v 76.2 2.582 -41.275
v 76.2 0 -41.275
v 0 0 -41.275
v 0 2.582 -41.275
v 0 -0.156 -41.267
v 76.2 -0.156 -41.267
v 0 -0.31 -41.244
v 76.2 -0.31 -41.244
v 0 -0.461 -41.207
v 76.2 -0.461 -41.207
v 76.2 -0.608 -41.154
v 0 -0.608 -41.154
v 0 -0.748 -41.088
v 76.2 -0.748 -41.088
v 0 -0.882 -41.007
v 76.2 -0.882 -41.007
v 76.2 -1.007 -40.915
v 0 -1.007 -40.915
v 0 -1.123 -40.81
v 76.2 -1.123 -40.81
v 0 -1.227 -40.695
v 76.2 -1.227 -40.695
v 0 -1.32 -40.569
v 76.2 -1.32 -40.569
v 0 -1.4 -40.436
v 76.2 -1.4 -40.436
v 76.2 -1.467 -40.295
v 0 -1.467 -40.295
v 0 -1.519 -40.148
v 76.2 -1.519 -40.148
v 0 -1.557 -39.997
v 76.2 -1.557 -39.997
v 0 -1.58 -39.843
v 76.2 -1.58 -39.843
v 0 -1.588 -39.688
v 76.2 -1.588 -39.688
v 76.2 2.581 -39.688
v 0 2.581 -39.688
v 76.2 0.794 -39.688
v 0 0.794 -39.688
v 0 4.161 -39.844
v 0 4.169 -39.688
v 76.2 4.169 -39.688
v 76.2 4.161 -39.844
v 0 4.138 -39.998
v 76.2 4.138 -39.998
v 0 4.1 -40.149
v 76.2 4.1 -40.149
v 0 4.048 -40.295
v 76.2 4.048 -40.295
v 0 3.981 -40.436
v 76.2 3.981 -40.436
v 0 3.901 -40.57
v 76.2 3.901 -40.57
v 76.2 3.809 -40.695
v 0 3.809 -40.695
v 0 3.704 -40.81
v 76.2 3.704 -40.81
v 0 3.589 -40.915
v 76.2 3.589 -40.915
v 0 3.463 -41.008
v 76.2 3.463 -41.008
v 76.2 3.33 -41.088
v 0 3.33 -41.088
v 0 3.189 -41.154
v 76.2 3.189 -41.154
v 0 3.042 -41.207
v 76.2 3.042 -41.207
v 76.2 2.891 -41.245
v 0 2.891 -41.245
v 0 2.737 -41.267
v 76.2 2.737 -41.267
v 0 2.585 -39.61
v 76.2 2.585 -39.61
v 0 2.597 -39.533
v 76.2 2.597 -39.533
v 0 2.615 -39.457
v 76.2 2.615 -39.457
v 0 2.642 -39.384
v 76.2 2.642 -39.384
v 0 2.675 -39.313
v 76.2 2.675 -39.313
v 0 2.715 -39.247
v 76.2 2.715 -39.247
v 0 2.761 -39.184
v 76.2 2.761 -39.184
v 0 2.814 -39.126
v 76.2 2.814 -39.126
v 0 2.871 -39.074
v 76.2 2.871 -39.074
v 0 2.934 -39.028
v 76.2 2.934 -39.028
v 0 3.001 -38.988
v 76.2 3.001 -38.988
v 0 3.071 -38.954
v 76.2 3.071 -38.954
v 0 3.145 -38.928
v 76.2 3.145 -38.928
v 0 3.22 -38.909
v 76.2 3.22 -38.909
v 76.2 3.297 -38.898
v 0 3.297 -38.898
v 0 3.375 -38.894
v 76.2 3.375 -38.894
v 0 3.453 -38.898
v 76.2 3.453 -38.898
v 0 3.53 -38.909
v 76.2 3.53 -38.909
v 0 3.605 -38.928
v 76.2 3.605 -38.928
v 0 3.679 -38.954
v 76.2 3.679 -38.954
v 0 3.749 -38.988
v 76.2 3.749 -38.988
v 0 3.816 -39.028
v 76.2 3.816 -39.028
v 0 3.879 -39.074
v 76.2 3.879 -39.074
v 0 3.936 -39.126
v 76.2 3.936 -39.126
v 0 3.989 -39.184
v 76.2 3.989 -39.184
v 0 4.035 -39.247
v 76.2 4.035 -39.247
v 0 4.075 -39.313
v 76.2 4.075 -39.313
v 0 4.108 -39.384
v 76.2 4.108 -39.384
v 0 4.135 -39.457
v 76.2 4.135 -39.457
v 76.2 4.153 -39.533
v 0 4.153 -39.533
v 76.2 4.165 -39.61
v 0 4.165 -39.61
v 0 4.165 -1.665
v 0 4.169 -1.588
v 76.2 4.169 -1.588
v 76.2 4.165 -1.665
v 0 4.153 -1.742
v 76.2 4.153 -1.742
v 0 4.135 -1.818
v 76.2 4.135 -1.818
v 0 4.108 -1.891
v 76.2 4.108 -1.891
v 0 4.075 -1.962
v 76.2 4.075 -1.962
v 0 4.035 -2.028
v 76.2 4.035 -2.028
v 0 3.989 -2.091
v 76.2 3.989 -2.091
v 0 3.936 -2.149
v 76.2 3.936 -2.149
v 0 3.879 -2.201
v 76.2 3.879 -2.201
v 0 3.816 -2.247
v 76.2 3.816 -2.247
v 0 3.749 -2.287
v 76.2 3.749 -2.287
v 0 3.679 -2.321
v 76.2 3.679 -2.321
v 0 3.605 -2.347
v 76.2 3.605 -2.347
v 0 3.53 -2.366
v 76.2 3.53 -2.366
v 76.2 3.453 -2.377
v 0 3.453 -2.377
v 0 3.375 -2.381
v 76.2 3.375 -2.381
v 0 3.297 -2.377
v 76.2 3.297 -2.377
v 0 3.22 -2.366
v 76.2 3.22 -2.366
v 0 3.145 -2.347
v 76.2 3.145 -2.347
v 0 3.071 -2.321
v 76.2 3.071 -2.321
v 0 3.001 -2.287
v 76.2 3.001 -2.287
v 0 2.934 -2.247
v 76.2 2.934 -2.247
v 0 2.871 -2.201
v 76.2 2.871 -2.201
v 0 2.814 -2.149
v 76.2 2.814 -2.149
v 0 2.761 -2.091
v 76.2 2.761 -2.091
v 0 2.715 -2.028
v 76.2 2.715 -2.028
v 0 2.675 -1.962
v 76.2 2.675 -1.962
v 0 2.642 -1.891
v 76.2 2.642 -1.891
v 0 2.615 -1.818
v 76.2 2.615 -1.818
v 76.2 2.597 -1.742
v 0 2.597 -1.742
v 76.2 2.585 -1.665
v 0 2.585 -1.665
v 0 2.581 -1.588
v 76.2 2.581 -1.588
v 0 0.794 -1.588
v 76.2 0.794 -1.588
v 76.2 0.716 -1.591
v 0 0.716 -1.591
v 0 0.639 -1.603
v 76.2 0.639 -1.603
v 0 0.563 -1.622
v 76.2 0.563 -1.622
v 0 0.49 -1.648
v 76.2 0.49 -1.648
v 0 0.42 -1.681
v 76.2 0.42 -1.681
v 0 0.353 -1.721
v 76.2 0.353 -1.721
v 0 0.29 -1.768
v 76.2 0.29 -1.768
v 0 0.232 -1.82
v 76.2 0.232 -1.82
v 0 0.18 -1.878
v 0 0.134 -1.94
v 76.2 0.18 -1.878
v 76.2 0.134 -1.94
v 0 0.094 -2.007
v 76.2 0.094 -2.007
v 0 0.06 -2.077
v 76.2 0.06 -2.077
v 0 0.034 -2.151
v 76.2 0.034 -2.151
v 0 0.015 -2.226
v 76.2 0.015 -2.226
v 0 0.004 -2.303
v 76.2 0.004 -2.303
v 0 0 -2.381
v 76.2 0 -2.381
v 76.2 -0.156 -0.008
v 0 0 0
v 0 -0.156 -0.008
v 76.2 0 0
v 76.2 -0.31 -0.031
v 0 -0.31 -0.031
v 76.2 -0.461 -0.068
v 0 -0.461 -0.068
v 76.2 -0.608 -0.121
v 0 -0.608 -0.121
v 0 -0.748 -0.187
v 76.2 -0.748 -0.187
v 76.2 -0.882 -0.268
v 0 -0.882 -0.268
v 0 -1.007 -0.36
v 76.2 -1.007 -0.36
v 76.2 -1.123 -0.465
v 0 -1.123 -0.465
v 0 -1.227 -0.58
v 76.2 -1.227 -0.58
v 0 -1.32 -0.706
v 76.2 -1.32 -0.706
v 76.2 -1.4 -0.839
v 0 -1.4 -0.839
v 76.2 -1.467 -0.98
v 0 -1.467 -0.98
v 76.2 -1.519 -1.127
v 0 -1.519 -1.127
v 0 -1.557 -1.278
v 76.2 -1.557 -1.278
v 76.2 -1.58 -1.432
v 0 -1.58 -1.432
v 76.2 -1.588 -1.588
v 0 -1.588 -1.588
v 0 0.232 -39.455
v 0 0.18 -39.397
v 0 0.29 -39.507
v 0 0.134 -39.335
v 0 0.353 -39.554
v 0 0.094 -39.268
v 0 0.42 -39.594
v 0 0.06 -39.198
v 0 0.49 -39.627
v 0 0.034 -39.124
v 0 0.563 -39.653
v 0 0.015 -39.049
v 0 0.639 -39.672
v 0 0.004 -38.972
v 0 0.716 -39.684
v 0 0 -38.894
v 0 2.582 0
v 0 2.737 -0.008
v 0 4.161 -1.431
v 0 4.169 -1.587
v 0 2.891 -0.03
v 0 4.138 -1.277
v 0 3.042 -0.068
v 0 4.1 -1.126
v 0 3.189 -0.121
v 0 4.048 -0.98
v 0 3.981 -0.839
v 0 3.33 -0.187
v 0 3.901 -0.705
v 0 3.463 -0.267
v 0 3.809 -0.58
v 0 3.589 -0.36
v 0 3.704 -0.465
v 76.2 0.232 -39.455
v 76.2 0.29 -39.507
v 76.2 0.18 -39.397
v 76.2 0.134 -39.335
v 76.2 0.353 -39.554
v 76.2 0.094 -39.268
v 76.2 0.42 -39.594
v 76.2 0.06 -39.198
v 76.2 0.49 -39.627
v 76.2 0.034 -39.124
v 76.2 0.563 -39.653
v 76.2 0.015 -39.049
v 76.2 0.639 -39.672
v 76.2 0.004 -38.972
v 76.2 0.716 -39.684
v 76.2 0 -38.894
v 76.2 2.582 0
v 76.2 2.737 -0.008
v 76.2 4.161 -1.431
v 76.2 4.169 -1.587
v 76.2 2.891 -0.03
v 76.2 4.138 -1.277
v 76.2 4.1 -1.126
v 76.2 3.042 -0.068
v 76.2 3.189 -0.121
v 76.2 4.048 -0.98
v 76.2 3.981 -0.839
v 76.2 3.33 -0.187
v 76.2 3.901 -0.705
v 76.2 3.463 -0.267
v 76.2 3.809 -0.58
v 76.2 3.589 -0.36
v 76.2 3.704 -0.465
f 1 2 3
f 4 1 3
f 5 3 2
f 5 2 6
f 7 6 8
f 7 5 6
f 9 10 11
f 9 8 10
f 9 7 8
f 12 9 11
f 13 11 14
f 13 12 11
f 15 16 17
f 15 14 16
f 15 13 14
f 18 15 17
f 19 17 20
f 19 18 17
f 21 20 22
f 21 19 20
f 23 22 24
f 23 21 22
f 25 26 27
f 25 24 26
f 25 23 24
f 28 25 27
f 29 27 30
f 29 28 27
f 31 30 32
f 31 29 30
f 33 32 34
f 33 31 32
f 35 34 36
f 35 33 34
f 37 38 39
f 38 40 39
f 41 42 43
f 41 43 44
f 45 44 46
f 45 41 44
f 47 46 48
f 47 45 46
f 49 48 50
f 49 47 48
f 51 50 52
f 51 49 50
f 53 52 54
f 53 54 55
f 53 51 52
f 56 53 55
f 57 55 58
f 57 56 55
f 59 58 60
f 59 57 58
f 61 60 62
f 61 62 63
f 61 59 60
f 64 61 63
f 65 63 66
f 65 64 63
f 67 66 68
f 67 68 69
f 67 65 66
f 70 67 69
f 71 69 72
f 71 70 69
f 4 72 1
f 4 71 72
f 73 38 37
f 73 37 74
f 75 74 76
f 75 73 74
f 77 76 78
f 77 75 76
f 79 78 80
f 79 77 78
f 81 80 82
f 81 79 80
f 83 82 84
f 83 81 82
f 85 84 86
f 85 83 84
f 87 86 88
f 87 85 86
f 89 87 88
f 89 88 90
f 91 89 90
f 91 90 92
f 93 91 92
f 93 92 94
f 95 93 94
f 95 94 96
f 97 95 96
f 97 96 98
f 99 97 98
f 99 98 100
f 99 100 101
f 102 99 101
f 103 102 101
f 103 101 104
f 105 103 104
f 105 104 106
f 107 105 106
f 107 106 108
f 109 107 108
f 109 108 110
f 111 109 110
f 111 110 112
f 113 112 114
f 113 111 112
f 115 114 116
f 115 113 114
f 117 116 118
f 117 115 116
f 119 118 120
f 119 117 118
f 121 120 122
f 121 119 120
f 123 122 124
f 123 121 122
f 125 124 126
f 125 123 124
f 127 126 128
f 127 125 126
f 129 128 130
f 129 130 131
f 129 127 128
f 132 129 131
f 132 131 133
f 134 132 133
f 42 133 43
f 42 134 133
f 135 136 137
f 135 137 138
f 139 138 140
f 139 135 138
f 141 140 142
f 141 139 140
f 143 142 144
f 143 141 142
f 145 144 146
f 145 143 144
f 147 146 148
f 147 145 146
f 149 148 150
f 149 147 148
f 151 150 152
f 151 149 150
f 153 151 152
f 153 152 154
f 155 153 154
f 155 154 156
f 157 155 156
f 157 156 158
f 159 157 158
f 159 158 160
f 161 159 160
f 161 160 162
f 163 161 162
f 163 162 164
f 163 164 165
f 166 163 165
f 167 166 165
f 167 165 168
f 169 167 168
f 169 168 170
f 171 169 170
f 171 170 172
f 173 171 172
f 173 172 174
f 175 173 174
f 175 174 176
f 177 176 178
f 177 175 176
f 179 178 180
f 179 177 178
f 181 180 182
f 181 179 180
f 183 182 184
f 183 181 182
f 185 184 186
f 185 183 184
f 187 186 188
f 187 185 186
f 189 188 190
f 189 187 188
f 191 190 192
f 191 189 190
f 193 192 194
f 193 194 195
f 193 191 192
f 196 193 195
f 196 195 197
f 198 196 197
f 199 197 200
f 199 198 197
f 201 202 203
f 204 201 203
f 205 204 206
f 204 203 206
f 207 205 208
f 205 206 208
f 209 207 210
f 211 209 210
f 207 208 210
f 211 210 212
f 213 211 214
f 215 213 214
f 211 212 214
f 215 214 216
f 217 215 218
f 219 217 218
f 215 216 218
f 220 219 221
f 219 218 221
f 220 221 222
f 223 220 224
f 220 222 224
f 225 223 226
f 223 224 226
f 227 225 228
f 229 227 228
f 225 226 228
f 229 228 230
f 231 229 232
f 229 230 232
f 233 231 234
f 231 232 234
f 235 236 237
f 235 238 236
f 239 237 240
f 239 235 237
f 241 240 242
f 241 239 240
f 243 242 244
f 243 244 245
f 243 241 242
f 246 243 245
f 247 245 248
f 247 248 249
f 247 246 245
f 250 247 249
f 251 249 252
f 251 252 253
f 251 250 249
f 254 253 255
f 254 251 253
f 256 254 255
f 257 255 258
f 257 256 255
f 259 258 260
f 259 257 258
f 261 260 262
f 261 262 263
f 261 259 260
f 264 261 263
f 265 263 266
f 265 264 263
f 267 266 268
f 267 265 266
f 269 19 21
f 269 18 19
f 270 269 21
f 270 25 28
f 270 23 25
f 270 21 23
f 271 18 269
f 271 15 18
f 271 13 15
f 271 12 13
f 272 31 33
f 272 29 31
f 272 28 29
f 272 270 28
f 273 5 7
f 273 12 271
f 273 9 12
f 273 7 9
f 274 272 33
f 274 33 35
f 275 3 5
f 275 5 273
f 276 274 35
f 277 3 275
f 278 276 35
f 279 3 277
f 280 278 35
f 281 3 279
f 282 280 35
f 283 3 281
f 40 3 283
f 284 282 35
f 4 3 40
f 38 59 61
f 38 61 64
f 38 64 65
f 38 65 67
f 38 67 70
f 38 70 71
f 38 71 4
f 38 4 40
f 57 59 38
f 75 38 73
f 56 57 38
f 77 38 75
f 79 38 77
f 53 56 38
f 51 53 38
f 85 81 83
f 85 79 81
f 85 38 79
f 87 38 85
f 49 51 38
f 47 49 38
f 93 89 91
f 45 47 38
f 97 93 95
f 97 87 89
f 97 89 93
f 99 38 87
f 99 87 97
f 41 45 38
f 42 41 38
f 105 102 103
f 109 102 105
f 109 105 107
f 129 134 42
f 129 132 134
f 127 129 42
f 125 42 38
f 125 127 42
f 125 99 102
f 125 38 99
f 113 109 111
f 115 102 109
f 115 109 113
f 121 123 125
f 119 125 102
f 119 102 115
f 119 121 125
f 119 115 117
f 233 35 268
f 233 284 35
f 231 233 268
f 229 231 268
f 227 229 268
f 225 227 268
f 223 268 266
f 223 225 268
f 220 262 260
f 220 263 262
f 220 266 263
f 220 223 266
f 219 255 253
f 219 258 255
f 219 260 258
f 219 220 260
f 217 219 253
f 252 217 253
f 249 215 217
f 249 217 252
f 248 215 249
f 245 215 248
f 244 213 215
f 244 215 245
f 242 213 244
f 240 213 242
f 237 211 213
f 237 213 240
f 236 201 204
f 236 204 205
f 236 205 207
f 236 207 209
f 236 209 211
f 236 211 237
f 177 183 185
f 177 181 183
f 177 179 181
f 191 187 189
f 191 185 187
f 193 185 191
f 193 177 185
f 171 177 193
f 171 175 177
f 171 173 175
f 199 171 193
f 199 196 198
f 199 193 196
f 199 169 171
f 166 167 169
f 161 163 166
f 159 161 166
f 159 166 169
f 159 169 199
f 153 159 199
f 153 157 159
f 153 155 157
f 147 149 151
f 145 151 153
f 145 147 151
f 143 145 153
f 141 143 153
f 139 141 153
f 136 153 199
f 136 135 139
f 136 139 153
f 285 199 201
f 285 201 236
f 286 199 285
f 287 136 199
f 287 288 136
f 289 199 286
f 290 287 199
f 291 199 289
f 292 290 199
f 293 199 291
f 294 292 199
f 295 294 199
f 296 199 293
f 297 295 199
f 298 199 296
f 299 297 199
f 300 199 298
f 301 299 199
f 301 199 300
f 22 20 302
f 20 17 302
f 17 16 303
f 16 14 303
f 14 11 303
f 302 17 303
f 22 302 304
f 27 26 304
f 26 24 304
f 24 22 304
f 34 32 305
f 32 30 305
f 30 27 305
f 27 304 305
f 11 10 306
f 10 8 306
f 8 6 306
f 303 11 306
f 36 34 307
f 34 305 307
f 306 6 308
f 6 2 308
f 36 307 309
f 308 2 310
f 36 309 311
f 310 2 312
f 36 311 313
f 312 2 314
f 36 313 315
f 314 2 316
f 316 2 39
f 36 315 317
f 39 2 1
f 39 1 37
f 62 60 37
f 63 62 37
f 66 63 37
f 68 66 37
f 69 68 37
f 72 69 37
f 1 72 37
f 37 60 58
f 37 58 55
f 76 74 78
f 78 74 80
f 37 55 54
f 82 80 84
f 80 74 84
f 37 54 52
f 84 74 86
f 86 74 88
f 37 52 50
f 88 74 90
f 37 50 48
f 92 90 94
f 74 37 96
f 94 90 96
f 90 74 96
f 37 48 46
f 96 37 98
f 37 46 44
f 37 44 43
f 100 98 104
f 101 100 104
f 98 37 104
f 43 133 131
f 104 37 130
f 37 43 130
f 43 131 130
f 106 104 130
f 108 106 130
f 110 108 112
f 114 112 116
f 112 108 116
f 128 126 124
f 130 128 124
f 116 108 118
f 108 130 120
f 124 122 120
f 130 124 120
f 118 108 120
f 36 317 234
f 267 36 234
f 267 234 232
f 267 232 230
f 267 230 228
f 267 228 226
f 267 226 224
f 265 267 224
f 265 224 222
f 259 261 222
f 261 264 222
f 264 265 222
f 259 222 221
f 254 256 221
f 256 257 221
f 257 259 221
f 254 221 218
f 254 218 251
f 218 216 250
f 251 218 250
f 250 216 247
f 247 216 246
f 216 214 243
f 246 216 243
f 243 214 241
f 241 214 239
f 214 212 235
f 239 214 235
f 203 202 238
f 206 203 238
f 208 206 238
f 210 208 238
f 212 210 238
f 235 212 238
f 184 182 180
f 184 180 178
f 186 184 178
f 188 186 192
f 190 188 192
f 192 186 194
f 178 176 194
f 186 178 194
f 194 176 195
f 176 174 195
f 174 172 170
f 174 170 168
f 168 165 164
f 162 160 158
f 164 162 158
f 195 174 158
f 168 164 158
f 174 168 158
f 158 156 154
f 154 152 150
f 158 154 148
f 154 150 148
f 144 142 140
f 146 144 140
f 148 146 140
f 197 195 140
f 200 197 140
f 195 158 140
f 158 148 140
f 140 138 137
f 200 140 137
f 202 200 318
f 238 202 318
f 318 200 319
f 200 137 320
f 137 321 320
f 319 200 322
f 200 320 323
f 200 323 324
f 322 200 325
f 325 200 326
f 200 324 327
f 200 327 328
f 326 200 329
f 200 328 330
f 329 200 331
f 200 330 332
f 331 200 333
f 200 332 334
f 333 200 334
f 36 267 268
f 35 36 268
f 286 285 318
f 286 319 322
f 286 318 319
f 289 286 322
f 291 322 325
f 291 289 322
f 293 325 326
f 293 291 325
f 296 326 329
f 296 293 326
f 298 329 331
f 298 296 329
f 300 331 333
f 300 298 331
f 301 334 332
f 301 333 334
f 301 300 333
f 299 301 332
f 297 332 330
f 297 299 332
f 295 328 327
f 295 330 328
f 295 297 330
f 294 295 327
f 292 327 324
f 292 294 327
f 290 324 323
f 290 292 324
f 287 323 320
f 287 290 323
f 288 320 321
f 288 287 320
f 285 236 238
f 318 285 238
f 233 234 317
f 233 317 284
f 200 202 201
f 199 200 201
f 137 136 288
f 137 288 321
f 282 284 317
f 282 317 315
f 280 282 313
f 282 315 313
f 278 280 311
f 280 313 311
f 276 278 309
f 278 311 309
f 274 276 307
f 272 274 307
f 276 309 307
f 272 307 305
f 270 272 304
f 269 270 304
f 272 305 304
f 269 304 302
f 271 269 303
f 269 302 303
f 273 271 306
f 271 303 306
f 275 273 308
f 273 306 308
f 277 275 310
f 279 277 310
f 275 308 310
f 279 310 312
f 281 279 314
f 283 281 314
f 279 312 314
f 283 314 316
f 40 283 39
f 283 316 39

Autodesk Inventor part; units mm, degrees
ref_plane "YZ Plane" through (0, 0, 0) normal (1, 0, 0) x (0, 1, 0)
ref_plane "XZ Plane" through (0, 0, 0) normal (0, 1, 0) x (-1, 0, 0)
sketch "Sketch1" plane through (0, 0, 0) normal (0, 1, 0) x (-1, 0, 0)
  line L0 (0, 0) -> (-76.2, 0)
  line L1 (-76.2, 0) -> (-76.2, -41.275)
  line L2 (-76.2, -41.275) -> (0, -41.275)
  line L3 (0, -41.275) -> (0, 0)
  line L4 (0, -39.6875) -> (-76.2, -39.6875)
  line L5 (0, -20.6375) -> (-76.2, -20.6375) construction
  dimension "d0" = 76.2
  dimension "d1" = 41.275
  dimension "d4" = 1.5875
extrude "Extrusion1" add sketch "Sketch1" against normal blind 1.5875
ref_plane "Work Plane1" through (76.2, 0, -20.6375) normal (0, 0, -1) x (-1, 0, 0)
extrude "Extrusion2" add sketch "Sketch1" along normal blind 4.1688 contours L3 L2 L1 L4
sketch "Sketch2" plane through (0, -1.5875, 0) normal (-1, 0, 0) x (0, 0, 1)
  line L0 (-41.275, 5.7563) -> (-39.6875, 5.7563) construction
  line L1 (-39.6875, 1.5875) -> (-39.6875, 5.7563) construction
  circle A0 centre (-39.6875, 4.9625) radius 0.7937
  dimension "d7" = 1.5875
extrude "Extrusion3" add sketch "Sketch2" against normal up to surface (76.2 mm away)
fillet "Fillet1" radius 1.5875 1 edges at (38.1, 4.1688, -41.275)
mirror "Mirror1" about plane through (76.2, 0, -20.6375) normal (0, 0, -1) of "Extrusion2", "Extrusion3", "Fillet1"
fillet "Fillet2" radius 1.5875 2 edges at (38.1, -1.5875, -41.275) (38.1, -1.5875, 0)
fillet "Fillet3" radius 0.7937 2 edges at (38.1, 0, -39.6875) (38.1, 0, -1.5875)
properties part number "Duct Cover"
